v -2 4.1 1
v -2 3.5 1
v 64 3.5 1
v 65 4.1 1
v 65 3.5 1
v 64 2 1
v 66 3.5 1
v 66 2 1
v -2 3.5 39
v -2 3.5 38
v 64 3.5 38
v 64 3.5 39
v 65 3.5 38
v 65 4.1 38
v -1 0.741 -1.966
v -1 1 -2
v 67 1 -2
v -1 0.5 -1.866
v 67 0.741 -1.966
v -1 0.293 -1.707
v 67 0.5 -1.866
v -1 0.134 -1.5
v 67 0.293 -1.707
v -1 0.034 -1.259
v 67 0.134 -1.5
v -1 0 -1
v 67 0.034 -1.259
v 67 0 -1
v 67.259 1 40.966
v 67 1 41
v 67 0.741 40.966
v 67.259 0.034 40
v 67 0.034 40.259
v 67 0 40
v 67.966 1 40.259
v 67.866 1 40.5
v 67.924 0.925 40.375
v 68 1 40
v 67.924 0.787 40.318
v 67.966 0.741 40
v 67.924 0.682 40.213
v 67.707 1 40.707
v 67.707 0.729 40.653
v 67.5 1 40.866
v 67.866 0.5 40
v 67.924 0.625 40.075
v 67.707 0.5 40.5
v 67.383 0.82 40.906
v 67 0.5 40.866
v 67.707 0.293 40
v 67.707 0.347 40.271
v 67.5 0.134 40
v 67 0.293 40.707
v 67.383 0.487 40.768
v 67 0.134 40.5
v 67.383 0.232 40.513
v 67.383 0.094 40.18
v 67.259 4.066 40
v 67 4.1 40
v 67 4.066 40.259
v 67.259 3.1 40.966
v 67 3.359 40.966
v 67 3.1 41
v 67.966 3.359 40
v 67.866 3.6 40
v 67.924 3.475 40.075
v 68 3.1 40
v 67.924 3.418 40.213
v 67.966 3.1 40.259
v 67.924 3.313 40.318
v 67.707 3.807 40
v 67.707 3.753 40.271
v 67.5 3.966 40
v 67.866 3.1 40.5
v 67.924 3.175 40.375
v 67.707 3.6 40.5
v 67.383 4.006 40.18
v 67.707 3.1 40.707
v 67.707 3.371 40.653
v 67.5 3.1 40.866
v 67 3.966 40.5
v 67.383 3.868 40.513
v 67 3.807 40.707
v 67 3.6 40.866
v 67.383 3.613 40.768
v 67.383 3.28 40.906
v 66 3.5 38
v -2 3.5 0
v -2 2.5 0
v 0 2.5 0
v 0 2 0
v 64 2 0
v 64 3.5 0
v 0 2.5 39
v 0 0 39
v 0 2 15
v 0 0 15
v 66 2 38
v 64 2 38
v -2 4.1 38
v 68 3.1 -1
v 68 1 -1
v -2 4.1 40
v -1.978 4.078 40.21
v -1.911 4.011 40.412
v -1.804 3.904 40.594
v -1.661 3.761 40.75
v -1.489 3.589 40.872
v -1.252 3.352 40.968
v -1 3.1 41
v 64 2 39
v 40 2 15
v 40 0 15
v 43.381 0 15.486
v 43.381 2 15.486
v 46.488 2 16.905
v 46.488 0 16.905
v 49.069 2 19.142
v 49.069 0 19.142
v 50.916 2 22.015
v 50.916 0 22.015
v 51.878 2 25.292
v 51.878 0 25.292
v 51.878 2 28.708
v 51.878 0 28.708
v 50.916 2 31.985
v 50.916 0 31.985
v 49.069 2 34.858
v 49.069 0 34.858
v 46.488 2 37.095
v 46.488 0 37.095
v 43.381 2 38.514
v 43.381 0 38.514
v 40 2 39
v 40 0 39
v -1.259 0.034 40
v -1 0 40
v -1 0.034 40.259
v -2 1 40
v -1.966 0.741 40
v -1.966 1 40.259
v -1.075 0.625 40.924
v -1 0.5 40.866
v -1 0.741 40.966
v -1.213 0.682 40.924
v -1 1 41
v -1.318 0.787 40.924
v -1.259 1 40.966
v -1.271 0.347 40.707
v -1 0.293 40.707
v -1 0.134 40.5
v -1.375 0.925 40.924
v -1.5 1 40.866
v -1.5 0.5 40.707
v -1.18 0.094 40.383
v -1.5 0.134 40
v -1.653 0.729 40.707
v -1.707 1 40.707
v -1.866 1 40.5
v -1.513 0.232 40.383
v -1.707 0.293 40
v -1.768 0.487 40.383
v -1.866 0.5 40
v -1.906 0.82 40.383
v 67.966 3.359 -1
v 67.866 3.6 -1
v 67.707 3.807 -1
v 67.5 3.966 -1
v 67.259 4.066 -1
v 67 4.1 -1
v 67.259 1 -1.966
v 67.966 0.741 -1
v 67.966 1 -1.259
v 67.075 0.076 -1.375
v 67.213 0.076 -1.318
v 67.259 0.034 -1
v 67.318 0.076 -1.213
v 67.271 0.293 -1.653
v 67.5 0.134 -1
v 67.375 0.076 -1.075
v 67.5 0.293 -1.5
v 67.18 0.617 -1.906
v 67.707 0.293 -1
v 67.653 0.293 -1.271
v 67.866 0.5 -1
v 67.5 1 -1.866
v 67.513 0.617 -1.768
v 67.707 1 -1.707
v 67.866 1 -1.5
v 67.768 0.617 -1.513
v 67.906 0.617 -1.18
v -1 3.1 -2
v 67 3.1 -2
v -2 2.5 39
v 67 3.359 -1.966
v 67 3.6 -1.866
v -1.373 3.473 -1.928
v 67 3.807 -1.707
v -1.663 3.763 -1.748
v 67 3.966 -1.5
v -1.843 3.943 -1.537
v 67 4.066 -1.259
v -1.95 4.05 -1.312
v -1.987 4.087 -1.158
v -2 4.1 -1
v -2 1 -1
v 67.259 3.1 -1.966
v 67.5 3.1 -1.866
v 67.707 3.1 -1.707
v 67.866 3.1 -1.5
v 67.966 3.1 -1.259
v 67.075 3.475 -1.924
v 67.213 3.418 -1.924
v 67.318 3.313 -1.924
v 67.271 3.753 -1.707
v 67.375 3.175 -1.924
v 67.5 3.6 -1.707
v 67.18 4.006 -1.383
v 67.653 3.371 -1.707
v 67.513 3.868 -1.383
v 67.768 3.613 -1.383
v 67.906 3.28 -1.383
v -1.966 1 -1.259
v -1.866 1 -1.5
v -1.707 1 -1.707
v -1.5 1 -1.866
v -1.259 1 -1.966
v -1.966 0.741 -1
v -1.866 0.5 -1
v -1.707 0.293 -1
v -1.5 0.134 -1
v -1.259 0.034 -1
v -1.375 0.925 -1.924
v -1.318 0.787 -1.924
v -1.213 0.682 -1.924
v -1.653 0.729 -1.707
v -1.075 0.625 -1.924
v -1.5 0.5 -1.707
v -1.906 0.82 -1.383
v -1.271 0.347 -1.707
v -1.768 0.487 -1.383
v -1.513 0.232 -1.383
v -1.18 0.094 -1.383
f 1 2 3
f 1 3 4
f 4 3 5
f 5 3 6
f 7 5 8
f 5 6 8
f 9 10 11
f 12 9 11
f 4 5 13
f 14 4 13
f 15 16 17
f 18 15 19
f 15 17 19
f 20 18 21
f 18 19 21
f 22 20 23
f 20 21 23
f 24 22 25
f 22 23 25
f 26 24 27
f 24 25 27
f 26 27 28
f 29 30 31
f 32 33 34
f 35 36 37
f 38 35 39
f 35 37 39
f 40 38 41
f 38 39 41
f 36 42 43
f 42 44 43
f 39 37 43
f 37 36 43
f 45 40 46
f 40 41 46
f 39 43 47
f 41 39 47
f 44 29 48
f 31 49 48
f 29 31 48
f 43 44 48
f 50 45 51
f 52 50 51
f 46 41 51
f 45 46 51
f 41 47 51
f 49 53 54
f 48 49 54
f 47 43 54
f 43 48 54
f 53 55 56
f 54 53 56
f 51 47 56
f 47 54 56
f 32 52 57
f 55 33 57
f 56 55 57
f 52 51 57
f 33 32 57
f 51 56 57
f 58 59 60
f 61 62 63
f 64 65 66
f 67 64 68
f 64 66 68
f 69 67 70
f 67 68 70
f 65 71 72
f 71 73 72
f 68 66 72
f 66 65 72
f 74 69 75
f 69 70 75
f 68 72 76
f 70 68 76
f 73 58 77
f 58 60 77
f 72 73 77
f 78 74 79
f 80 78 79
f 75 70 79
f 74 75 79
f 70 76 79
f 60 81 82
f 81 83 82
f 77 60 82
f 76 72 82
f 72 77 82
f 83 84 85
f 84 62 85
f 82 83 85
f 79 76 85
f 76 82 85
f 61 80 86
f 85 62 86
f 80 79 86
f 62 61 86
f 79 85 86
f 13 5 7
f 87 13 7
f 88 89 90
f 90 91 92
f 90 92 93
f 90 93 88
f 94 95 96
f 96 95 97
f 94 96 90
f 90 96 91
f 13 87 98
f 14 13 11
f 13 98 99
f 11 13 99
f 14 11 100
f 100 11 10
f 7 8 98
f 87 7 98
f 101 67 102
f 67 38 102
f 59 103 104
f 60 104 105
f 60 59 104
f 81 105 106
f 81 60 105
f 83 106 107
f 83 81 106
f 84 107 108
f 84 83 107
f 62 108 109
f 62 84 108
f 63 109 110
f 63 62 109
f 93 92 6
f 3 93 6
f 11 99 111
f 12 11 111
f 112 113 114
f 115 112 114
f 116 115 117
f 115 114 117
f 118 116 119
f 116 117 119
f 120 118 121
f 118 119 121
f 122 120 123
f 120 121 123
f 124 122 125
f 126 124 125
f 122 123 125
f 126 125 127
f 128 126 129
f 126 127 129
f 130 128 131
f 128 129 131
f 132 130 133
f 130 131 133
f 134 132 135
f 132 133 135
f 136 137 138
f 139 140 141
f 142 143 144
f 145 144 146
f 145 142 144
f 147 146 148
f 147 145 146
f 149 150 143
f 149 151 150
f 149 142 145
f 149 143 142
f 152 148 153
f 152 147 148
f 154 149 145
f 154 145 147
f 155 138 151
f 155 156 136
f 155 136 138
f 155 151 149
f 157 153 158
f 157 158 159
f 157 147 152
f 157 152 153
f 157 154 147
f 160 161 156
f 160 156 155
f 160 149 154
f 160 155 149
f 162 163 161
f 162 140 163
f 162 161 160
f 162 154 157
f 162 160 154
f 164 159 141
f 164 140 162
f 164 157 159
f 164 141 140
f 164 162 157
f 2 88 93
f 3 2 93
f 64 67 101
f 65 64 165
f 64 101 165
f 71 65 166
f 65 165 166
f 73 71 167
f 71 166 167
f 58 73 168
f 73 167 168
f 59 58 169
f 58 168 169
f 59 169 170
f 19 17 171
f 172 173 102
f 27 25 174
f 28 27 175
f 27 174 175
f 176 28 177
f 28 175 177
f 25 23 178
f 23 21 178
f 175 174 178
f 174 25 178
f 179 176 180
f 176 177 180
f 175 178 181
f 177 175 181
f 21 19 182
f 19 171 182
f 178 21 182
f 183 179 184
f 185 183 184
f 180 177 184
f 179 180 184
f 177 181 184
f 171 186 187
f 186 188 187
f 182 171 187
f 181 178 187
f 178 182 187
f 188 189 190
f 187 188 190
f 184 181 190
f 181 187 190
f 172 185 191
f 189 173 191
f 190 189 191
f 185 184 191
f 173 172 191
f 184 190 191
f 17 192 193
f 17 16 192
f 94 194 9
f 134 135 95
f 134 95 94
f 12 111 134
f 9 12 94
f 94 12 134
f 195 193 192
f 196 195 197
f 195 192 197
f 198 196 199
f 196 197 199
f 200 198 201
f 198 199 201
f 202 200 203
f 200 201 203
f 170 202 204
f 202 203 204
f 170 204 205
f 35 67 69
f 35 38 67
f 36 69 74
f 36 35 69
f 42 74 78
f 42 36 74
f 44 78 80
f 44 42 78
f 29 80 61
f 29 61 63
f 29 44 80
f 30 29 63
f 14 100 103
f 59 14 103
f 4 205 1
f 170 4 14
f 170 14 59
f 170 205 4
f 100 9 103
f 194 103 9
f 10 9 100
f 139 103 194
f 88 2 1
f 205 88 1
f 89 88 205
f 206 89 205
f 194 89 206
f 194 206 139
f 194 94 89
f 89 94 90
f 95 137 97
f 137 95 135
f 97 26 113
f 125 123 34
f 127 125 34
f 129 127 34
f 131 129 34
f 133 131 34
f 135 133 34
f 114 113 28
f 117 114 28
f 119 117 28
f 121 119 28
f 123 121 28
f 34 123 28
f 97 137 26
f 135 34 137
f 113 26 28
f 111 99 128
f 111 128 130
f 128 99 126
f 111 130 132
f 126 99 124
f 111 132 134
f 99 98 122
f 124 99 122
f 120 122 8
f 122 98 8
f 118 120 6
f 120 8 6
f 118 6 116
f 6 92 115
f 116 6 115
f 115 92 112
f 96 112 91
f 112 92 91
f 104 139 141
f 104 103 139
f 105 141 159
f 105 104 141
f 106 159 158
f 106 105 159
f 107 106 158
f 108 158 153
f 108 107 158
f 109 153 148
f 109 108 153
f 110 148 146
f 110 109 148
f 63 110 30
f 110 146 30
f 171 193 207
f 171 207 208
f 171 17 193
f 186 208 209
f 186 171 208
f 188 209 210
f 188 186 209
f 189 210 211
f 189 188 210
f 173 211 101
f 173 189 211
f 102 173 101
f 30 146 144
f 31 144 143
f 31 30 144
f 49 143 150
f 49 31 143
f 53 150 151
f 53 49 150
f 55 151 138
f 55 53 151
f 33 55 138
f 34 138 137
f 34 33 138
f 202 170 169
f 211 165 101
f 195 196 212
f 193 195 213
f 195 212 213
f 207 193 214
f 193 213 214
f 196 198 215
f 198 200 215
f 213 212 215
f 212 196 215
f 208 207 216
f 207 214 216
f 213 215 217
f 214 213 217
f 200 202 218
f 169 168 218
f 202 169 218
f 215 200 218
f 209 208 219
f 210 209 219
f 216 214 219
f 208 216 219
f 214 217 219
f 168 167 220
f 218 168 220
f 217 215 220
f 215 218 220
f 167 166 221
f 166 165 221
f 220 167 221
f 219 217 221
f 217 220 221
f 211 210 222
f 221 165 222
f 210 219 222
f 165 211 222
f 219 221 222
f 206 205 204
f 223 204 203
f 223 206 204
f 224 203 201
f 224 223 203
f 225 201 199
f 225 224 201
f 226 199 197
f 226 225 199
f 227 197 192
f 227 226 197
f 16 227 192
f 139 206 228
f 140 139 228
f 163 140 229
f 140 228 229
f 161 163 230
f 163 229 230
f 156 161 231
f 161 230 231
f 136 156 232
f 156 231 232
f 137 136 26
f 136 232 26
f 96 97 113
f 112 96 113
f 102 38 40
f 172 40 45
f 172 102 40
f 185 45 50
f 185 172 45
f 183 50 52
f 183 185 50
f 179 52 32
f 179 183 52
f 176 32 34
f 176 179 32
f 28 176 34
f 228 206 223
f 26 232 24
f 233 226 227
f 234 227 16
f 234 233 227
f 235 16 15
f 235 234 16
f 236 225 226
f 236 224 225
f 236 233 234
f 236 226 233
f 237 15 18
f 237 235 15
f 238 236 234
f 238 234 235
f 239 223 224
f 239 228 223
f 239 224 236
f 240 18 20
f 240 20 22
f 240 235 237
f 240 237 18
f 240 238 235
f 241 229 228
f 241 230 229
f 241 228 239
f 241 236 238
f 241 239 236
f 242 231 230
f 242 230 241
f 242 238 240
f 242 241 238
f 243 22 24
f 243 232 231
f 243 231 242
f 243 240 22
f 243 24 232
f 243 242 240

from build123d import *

# Parameters (mm, degrees)
BOSS_EXTRUDE1_DEPTH      = 2
SKETCH1_3_W              = 70
SKETCH1_3_H              = 43
BOSS_EXTRUDE2_DEPTH      = 4
SKETCH1_5_W              = 40
SKETCH1_5_H              = 24
CUT_EXTRUDE4_DEPTH       = 2
CUT_EXTRUDE5_REACH       = 81.505
SKETCH2_W                = 39
SKETCH2_H                = 1.5
BOSS_EXTRUDE3_DEPTH      = 0.1
BOSS_EXTRUDE3_DEPTH_BACK = 0.5
FILLET1_R                = 1


with BuildPart() as part:
    # Sketch1 → Boss-Extrude1 (new body)
    with BuildSketch(Plane(origin=(0, 0, 0), x_dir=(1, 0, 0), z_dir=(0, 1, 0))):
        Polygon((0, 0), (64, 0), (64, -1), (66, -1), (66, -38), (64, -38), (64, -39), (0, -39), align=None)
    extrude(amount=BOSS_EXTRUDE1_DEPTH)

    # Sketch1<3> → Boss-Extrude2 (add)
    with BuildSketch(Plane(origin=(0, 0, 0), x_dir=(1, 0, 0), z_dir=(0, 1, 0))):
        with Locations((33, -19.5)):
            Rectangle(SKETCH1_3_W, SKETCH1_3_H)
        Polygon((0, 0), (64, 0), (64, -1), (66, -1), (66, -38), (64, -38), (64, -39), (0, -39), align=None, mode=Mode.SUBTRACT)
    extrude(amount=BOSS_EXTRUDE2_DEPTH)

    # Sketch1<5> → Cut-Extrude4 (cut)
    with BuildSketch(Plane(origin=(0, 0, 0), x_dir=(1, 0, 0), z_dir=(0, 1, 0))):
        with Locations((20, -27)):
            Rectangle(SKETCH1_5_W, SKETCH1_5_H)
        with BuildLine():
            ThreePointArc((40, -15), (52, -27), (40, -39))
            Line((40, -39), (40, -15))
        make_face()
    extrude(amount=CUT_EXTRUDE4_DEPTH, mode=Mode.SUBTRACT)

    # Sketch2 → Cut-Extrude5 (cut, up to next)
    with BuildSketch(Plane(origin=(0, 0, 0), x_dir=(0, 0, -1), z_dir=(1, 0, 0)), mode=Mode.PRIVATE) as cut_extrude5_sk1:
        with Locations((-19.5, 3.25)):
            Rectangle(SKETCH2_W, SKETCH2_H)
    cut_extrude5_tool1 = extrude(cut_extrude5_sk1.sketch, amount=-CUT_EXTRUDE5_REACH, mode=Mode.PRIVATE) & part.part
    add(cut_extrude5_tool1.solids().sort_by_distance((0, 3.25, 19.5))[0], mode=Mode.SUBTRACT)

    # Sketch3 → Boss-Extrude3 (add, two sides: drawn at the far end of the back side and taken through both)
    with BuildSketch(Plane(origin=(0, 4, 0), x_dir=(1, 0, 0), z_dir=(0, 1, 0)).offset(-BOSS_EXTRUDE3_DEPTH_BACK)):
        Polygon((-2, -41), (68, -41), (68, 2), (-2, 2), (-2, -1), (65, -1), (65, -38), (-2, -38), align=None)
    extrude(amount=BOSS_EXTRUDE3_DEPTH + BOSS_EXTRUDE3_DEPTH_BACK)

    # Fillet1
    fillet1_edges = [part.edges().sort_by_distance(p)[0] for p in [
        (33, 4.1, 41),
        (68, 4.1, 19.5),
        (33, 4.1, -2),
        (68, 2.05, -2),
        (-2, 0, 19.5),
        (-2, 2.05, -2),
        (33, 0, 41),
        (-2, 2.05, 41),
        (68, 2.05, 41),
        (33, 0, -2),
        (68, 0, 19.5),
    ]]
    fillet(fillet1_edges, radius=FILLET1_R)


solid = part.part
